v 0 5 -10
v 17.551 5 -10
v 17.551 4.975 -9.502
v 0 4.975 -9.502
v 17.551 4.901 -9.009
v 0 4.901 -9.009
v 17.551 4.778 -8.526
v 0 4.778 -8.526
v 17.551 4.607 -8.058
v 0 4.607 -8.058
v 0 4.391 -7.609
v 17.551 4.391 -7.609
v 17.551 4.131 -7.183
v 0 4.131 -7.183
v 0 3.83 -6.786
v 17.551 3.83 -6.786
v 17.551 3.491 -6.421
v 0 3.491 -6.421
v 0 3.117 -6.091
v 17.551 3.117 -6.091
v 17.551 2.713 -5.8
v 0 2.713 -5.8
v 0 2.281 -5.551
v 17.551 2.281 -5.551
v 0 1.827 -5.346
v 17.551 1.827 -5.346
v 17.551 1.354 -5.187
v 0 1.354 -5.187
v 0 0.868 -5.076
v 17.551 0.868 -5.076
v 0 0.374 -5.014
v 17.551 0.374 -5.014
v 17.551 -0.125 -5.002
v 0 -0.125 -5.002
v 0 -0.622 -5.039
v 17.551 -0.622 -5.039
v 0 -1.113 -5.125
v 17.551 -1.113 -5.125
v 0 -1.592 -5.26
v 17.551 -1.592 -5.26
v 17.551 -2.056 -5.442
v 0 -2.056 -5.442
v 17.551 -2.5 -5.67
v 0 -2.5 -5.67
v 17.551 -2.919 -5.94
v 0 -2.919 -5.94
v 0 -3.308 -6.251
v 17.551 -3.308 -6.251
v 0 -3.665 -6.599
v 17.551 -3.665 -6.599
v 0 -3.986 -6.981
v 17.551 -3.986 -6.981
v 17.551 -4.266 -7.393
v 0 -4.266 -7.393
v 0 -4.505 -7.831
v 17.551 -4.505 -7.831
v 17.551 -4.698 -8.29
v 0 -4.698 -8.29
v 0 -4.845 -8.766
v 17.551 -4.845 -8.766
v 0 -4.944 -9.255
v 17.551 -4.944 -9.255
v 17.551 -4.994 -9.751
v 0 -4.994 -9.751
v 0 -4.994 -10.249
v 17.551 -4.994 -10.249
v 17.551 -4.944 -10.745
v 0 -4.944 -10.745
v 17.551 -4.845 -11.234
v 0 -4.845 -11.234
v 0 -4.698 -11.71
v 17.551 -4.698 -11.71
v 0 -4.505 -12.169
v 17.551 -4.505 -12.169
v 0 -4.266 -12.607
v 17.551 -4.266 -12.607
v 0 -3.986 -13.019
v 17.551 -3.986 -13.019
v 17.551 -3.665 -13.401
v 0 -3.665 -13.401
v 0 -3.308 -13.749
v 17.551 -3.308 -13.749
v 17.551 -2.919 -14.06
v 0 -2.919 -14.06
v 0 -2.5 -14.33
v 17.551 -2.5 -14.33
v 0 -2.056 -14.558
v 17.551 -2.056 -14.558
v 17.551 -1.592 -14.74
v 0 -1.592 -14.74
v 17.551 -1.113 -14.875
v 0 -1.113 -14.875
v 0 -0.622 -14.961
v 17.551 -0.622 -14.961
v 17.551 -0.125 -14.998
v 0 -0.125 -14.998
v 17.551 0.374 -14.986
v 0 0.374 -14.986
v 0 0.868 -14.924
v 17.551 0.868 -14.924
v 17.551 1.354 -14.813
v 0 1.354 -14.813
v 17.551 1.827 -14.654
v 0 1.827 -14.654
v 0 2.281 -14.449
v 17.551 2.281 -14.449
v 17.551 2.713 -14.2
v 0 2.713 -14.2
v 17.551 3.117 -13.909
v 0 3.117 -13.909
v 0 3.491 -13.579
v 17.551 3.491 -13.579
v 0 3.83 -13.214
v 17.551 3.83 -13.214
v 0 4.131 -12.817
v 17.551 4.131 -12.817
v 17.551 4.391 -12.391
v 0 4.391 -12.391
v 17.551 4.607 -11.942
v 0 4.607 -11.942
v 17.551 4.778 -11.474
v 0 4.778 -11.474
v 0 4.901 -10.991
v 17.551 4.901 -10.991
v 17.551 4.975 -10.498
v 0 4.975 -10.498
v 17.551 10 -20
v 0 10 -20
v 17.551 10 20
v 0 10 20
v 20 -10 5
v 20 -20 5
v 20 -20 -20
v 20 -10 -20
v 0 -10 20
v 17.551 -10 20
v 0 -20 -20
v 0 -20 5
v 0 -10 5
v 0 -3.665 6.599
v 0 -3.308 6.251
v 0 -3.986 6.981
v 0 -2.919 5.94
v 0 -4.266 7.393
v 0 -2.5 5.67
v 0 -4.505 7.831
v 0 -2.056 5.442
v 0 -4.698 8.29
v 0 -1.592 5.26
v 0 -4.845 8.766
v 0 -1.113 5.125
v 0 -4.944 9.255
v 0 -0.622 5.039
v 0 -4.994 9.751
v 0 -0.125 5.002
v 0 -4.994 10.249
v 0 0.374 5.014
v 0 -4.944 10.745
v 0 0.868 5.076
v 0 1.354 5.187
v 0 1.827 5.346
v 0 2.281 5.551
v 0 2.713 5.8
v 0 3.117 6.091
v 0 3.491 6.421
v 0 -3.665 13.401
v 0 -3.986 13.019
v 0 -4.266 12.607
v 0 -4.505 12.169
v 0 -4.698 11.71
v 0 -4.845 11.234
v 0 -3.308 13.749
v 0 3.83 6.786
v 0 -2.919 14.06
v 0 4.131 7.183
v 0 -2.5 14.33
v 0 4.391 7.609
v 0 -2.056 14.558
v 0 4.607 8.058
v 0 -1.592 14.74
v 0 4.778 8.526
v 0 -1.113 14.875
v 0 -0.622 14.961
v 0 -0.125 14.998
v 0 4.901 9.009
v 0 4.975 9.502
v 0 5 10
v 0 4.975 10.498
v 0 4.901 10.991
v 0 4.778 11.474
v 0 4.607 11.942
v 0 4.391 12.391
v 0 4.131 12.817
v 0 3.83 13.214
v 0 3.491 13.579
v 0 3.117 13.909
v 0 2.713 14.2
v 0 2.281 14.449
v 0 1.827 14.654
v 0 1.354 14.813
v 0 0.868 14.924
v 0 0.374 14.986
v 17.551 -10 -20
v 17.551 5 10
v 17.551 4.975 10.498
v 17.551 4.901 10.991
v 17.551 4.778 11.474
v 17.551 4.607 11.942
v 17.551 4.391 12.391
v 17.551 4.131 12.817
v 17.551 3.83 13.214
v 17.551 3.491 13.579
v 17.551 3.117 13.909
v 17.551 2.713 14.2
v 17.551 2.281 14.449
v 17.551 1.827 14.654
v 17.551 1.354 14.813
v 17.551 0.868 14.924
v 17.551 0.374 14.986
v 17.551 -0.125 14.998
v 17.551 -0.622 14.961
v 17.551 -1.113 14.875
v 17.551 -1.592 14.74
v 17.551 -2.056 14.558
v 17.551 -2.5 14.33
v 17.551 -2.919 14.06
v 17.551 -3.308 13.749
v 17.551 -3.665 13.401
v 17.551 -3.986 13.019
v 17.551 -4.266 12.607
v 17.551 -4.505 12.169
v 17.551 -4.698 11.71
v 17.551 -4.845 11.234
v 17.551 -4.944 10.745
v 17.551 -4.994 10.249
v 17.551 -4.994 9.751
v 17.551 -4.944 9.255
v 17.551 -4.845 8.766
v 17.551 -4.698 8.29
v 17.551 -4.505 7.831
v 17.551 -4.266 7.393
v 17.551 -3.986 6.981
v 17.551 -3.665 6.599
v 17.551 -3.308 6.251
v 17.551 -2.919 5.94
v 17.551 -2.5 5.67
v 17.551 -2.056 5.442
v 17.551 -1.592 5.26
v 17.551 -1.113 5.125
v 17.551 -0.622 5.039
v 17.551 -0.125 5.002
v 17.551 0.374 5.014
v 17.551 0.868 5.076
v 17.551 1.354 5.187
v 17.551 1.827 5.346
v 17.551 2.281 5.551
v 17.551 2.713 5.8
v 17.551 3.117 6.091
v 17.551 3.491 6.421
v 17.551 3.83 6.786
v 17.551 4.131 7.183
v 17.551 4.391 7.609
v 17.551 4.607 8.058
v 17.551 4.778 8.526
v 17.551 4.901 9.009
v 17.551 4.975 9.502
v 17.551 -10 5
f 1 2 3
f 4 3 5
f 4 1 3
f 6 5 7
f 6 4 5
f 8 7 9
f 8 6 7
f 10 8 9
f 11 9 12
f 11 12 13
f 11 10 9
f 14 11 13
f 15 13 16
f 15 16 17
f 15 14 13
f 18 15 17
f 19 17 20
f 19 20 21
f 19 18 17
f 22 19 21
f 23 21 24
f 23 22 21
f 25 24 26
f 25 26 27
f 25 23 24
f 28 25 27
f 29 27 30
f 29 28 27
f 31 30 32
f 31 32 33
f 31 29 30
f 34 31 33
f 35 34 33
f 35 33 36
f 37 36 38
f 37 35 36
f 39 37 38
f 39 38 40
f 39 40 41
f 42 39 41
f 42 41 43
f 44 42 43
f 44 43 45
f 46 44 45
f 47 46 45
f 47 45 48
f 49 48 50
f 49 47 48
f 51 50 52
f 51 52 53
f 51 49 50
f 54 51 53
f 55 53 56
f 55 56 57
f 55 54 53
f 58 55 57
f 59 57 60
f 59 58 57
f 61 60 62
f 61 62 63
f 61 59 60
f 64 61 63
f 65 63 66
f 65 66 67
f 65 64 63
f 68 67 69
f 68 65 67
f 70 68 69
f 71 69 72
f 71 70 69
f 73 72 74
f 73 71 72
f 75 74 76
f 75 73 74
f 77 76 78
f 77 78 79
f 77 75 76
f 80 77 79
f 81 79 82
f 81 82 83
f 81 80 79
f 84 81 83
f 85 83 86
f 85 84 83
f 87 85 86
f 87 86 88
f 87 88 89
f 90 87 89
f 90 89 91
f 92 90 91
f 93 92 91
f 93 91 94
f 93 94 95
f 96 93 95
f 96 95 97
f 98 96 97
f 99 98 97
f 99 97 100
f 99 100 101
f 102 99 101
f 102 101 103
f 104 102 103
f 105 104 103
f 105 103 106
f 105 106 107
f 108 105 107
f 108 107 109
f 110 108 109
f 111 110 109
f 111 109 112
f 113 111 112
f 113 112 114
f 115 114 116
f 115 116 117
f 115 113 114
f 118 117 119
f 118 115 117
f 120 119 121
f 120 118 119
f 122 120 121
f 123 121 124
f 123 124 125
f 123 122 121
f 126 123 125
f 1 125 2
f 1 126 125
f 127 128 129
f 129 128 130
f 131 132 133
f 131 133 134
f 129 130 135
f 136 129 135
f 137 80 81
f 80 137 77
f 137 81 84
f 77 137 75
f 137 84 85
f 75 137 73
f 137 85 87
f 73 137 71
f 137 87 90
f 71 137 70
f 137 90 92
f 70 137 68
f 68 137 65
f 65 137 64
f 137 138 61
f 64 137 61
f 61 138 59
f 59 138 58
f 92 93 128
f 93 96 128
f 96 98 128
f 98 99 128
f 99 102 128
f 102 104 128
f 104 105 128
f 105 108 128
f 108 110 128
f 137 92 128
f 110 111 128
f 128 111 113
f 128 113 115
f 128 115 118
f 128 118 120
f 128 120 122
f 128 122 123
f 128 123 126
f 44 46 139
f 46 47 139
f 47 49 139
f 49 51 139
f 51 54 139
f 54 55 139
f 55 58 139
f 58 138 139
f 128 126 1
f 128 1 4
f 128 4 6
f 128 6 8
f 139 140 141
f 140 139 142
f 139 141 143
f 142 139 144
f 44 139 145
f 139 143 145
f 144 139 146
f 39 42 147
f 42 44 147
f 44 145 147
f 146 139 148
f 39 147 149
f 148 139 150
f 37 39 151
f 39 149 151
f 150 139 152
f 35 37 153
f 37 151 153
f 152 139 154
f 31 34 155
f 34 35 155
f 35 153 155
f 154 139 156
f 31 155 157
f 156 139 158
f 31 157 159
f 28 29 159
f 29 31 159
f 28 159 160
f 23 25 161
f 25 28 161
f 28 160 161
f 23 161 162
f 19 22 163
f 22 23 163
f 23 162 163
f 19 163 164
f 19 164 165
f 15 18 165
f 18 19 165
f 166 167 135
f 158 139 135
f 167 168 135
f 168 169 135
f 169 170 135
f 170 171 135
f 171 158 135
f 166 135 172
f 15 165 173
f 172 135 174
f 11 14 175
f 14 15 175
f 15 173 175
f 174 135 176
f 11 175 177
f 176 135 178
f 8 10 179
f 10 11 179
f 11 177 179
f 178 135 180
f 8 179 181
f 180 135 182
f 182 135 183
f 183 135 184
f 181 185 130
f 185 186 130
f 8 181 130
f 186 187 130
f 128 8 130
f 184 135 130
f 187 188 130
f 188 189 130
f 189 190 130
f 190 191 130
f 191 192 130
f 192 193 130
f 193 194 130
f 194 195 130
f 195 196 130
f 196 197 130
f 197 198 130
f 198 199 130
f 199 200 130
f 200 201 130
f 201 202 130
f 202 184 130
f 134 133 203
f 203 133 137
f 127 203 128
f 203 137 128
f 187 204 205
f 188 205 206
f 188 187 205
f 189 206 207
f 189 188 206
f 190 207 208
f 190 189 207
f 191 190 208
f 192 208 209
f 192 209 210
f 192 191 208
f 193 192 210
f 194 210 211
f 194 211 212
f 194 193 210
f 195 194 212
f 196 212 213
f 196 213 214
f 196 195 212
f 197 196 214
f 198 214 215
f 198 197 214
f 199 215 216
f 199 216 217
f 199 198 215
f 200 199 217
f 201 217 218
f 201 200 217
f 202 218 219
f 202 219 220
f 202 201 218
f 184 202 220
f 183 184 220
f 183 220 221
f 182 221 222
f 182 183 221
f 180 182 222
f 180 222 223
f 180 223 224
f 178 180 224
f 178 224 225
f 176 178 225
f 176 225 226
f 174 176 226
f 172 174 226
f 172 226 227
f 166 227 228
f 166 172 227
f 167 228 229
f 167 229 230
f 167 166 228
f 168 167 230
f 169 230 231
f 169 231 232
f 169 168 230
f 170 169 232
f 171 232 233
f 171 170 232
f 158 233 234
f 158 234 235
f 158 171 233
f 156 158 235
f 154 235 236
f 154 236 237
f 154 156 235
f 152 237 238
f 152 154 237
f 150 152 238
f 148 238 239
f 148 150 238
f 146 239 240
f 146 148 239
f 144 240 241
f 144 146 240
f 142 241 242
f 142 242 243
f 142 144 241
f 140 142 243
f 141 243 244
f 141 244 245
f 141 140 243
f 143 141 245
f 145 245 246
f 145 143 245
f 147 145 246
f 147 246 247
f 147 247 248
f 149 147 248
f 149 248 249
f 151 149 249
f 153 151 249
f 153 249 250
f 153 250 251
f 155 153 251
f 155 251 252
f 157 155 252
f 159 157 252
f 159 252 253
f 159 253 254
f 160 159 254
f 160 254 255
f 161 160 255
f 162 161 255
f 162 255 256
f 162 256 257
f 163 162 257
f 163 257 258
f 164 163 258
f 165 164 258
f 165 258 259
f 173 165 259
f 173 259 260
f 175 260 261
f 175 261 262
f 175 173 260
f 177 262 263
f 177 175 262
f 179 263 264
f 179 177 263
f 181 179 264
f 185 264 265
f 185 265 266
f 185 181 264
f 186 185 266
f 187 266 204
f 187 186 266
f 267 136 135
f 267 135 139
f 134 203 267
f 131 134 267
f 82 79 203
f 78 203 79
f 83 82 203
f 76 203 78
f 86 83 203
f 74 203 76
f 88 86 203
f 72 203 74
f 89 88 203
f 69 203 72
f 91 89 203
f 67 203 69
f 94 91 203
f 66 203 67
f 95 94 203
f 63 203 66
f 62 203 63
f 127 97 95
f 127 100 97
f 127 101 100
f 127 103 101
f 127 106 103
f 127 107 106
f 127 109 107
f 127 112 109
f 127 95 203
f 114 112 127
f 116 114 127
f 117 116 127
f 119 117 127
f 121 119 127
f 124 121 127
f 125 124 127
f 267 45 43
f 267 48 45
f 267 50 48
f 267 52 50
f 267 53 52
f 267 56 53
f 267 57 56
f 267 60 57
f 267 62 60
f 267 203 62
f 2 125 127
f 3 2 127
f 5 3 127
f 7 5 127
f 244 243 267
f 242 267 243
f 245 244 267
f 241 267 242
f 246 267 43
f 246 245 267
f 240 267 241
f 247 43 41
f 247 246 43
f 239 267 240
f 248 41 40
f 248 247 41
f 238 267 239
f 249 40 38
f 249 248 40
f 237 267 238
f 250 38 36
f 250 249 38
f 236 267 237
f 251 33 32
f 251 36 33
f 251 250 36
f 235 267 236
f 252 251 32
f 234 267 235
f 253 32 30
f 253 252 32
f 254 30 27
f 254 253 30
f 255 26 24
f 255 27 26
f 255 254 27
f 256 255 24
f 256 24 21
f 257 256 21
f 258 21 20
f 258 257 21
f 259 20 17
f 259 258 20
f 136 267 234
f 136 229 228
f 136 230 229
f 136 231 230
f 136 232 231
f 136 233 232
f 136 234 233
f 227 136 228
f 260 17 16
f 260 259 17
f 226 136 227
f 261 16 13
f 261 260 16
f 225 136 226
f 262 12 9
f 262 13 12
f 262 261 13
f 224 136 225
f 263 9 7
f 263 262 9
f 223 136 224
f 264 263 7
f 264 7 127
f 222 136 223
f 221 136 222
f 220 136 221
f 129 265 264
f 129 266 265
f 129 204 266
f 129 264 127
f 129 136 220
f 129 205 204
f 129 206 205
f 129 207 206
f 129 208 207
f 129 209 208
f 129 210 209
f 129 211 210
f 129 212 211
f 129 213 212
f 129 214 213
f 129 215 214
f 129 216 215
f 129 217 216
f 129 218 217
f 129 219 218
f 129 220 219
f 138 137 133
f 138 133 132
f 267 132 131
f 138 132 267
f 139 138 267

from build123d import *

# Parameters (mm, degrees)
F0_R     = 5
F1_DEPTH = 17.5514
F0_W     = 10
F0_H     = 25
F2_DEPTH = 20
F3_R     = 5
F4_DEPTH = 17.5514


with BuildPart() as f1:
    # F0 (on Right) → F1 (new body)
    with BuildSketch(Plane.YZ):
        Polygon((10, -20), (10, 20), (-10, 20), (-10, 5), (-10, -20), align=None)
        with Locations((0, -10)):
            Circle(F0_R, mode=Mode.SUBTRACT)
    extrude(amount=F1_DEPTH)

    # F0 (on Right) → F2 (join)
    with BuildSketch(Plane.YZ):
        with Locations((-15, -7.5)):
            Rectangle(F0_W, F0_H)
    extrude(amount=F2_DEPTH)

    # F3 (on face) → F4 (cut, through all)
    with BuildSketch(Plane.YZ):
        with Locations((0, 10)):
            Circle(F3_R)
    extrude(amount=F4_DEPTH, mode=Mode.SUBTRACT)


solid = f1.part
